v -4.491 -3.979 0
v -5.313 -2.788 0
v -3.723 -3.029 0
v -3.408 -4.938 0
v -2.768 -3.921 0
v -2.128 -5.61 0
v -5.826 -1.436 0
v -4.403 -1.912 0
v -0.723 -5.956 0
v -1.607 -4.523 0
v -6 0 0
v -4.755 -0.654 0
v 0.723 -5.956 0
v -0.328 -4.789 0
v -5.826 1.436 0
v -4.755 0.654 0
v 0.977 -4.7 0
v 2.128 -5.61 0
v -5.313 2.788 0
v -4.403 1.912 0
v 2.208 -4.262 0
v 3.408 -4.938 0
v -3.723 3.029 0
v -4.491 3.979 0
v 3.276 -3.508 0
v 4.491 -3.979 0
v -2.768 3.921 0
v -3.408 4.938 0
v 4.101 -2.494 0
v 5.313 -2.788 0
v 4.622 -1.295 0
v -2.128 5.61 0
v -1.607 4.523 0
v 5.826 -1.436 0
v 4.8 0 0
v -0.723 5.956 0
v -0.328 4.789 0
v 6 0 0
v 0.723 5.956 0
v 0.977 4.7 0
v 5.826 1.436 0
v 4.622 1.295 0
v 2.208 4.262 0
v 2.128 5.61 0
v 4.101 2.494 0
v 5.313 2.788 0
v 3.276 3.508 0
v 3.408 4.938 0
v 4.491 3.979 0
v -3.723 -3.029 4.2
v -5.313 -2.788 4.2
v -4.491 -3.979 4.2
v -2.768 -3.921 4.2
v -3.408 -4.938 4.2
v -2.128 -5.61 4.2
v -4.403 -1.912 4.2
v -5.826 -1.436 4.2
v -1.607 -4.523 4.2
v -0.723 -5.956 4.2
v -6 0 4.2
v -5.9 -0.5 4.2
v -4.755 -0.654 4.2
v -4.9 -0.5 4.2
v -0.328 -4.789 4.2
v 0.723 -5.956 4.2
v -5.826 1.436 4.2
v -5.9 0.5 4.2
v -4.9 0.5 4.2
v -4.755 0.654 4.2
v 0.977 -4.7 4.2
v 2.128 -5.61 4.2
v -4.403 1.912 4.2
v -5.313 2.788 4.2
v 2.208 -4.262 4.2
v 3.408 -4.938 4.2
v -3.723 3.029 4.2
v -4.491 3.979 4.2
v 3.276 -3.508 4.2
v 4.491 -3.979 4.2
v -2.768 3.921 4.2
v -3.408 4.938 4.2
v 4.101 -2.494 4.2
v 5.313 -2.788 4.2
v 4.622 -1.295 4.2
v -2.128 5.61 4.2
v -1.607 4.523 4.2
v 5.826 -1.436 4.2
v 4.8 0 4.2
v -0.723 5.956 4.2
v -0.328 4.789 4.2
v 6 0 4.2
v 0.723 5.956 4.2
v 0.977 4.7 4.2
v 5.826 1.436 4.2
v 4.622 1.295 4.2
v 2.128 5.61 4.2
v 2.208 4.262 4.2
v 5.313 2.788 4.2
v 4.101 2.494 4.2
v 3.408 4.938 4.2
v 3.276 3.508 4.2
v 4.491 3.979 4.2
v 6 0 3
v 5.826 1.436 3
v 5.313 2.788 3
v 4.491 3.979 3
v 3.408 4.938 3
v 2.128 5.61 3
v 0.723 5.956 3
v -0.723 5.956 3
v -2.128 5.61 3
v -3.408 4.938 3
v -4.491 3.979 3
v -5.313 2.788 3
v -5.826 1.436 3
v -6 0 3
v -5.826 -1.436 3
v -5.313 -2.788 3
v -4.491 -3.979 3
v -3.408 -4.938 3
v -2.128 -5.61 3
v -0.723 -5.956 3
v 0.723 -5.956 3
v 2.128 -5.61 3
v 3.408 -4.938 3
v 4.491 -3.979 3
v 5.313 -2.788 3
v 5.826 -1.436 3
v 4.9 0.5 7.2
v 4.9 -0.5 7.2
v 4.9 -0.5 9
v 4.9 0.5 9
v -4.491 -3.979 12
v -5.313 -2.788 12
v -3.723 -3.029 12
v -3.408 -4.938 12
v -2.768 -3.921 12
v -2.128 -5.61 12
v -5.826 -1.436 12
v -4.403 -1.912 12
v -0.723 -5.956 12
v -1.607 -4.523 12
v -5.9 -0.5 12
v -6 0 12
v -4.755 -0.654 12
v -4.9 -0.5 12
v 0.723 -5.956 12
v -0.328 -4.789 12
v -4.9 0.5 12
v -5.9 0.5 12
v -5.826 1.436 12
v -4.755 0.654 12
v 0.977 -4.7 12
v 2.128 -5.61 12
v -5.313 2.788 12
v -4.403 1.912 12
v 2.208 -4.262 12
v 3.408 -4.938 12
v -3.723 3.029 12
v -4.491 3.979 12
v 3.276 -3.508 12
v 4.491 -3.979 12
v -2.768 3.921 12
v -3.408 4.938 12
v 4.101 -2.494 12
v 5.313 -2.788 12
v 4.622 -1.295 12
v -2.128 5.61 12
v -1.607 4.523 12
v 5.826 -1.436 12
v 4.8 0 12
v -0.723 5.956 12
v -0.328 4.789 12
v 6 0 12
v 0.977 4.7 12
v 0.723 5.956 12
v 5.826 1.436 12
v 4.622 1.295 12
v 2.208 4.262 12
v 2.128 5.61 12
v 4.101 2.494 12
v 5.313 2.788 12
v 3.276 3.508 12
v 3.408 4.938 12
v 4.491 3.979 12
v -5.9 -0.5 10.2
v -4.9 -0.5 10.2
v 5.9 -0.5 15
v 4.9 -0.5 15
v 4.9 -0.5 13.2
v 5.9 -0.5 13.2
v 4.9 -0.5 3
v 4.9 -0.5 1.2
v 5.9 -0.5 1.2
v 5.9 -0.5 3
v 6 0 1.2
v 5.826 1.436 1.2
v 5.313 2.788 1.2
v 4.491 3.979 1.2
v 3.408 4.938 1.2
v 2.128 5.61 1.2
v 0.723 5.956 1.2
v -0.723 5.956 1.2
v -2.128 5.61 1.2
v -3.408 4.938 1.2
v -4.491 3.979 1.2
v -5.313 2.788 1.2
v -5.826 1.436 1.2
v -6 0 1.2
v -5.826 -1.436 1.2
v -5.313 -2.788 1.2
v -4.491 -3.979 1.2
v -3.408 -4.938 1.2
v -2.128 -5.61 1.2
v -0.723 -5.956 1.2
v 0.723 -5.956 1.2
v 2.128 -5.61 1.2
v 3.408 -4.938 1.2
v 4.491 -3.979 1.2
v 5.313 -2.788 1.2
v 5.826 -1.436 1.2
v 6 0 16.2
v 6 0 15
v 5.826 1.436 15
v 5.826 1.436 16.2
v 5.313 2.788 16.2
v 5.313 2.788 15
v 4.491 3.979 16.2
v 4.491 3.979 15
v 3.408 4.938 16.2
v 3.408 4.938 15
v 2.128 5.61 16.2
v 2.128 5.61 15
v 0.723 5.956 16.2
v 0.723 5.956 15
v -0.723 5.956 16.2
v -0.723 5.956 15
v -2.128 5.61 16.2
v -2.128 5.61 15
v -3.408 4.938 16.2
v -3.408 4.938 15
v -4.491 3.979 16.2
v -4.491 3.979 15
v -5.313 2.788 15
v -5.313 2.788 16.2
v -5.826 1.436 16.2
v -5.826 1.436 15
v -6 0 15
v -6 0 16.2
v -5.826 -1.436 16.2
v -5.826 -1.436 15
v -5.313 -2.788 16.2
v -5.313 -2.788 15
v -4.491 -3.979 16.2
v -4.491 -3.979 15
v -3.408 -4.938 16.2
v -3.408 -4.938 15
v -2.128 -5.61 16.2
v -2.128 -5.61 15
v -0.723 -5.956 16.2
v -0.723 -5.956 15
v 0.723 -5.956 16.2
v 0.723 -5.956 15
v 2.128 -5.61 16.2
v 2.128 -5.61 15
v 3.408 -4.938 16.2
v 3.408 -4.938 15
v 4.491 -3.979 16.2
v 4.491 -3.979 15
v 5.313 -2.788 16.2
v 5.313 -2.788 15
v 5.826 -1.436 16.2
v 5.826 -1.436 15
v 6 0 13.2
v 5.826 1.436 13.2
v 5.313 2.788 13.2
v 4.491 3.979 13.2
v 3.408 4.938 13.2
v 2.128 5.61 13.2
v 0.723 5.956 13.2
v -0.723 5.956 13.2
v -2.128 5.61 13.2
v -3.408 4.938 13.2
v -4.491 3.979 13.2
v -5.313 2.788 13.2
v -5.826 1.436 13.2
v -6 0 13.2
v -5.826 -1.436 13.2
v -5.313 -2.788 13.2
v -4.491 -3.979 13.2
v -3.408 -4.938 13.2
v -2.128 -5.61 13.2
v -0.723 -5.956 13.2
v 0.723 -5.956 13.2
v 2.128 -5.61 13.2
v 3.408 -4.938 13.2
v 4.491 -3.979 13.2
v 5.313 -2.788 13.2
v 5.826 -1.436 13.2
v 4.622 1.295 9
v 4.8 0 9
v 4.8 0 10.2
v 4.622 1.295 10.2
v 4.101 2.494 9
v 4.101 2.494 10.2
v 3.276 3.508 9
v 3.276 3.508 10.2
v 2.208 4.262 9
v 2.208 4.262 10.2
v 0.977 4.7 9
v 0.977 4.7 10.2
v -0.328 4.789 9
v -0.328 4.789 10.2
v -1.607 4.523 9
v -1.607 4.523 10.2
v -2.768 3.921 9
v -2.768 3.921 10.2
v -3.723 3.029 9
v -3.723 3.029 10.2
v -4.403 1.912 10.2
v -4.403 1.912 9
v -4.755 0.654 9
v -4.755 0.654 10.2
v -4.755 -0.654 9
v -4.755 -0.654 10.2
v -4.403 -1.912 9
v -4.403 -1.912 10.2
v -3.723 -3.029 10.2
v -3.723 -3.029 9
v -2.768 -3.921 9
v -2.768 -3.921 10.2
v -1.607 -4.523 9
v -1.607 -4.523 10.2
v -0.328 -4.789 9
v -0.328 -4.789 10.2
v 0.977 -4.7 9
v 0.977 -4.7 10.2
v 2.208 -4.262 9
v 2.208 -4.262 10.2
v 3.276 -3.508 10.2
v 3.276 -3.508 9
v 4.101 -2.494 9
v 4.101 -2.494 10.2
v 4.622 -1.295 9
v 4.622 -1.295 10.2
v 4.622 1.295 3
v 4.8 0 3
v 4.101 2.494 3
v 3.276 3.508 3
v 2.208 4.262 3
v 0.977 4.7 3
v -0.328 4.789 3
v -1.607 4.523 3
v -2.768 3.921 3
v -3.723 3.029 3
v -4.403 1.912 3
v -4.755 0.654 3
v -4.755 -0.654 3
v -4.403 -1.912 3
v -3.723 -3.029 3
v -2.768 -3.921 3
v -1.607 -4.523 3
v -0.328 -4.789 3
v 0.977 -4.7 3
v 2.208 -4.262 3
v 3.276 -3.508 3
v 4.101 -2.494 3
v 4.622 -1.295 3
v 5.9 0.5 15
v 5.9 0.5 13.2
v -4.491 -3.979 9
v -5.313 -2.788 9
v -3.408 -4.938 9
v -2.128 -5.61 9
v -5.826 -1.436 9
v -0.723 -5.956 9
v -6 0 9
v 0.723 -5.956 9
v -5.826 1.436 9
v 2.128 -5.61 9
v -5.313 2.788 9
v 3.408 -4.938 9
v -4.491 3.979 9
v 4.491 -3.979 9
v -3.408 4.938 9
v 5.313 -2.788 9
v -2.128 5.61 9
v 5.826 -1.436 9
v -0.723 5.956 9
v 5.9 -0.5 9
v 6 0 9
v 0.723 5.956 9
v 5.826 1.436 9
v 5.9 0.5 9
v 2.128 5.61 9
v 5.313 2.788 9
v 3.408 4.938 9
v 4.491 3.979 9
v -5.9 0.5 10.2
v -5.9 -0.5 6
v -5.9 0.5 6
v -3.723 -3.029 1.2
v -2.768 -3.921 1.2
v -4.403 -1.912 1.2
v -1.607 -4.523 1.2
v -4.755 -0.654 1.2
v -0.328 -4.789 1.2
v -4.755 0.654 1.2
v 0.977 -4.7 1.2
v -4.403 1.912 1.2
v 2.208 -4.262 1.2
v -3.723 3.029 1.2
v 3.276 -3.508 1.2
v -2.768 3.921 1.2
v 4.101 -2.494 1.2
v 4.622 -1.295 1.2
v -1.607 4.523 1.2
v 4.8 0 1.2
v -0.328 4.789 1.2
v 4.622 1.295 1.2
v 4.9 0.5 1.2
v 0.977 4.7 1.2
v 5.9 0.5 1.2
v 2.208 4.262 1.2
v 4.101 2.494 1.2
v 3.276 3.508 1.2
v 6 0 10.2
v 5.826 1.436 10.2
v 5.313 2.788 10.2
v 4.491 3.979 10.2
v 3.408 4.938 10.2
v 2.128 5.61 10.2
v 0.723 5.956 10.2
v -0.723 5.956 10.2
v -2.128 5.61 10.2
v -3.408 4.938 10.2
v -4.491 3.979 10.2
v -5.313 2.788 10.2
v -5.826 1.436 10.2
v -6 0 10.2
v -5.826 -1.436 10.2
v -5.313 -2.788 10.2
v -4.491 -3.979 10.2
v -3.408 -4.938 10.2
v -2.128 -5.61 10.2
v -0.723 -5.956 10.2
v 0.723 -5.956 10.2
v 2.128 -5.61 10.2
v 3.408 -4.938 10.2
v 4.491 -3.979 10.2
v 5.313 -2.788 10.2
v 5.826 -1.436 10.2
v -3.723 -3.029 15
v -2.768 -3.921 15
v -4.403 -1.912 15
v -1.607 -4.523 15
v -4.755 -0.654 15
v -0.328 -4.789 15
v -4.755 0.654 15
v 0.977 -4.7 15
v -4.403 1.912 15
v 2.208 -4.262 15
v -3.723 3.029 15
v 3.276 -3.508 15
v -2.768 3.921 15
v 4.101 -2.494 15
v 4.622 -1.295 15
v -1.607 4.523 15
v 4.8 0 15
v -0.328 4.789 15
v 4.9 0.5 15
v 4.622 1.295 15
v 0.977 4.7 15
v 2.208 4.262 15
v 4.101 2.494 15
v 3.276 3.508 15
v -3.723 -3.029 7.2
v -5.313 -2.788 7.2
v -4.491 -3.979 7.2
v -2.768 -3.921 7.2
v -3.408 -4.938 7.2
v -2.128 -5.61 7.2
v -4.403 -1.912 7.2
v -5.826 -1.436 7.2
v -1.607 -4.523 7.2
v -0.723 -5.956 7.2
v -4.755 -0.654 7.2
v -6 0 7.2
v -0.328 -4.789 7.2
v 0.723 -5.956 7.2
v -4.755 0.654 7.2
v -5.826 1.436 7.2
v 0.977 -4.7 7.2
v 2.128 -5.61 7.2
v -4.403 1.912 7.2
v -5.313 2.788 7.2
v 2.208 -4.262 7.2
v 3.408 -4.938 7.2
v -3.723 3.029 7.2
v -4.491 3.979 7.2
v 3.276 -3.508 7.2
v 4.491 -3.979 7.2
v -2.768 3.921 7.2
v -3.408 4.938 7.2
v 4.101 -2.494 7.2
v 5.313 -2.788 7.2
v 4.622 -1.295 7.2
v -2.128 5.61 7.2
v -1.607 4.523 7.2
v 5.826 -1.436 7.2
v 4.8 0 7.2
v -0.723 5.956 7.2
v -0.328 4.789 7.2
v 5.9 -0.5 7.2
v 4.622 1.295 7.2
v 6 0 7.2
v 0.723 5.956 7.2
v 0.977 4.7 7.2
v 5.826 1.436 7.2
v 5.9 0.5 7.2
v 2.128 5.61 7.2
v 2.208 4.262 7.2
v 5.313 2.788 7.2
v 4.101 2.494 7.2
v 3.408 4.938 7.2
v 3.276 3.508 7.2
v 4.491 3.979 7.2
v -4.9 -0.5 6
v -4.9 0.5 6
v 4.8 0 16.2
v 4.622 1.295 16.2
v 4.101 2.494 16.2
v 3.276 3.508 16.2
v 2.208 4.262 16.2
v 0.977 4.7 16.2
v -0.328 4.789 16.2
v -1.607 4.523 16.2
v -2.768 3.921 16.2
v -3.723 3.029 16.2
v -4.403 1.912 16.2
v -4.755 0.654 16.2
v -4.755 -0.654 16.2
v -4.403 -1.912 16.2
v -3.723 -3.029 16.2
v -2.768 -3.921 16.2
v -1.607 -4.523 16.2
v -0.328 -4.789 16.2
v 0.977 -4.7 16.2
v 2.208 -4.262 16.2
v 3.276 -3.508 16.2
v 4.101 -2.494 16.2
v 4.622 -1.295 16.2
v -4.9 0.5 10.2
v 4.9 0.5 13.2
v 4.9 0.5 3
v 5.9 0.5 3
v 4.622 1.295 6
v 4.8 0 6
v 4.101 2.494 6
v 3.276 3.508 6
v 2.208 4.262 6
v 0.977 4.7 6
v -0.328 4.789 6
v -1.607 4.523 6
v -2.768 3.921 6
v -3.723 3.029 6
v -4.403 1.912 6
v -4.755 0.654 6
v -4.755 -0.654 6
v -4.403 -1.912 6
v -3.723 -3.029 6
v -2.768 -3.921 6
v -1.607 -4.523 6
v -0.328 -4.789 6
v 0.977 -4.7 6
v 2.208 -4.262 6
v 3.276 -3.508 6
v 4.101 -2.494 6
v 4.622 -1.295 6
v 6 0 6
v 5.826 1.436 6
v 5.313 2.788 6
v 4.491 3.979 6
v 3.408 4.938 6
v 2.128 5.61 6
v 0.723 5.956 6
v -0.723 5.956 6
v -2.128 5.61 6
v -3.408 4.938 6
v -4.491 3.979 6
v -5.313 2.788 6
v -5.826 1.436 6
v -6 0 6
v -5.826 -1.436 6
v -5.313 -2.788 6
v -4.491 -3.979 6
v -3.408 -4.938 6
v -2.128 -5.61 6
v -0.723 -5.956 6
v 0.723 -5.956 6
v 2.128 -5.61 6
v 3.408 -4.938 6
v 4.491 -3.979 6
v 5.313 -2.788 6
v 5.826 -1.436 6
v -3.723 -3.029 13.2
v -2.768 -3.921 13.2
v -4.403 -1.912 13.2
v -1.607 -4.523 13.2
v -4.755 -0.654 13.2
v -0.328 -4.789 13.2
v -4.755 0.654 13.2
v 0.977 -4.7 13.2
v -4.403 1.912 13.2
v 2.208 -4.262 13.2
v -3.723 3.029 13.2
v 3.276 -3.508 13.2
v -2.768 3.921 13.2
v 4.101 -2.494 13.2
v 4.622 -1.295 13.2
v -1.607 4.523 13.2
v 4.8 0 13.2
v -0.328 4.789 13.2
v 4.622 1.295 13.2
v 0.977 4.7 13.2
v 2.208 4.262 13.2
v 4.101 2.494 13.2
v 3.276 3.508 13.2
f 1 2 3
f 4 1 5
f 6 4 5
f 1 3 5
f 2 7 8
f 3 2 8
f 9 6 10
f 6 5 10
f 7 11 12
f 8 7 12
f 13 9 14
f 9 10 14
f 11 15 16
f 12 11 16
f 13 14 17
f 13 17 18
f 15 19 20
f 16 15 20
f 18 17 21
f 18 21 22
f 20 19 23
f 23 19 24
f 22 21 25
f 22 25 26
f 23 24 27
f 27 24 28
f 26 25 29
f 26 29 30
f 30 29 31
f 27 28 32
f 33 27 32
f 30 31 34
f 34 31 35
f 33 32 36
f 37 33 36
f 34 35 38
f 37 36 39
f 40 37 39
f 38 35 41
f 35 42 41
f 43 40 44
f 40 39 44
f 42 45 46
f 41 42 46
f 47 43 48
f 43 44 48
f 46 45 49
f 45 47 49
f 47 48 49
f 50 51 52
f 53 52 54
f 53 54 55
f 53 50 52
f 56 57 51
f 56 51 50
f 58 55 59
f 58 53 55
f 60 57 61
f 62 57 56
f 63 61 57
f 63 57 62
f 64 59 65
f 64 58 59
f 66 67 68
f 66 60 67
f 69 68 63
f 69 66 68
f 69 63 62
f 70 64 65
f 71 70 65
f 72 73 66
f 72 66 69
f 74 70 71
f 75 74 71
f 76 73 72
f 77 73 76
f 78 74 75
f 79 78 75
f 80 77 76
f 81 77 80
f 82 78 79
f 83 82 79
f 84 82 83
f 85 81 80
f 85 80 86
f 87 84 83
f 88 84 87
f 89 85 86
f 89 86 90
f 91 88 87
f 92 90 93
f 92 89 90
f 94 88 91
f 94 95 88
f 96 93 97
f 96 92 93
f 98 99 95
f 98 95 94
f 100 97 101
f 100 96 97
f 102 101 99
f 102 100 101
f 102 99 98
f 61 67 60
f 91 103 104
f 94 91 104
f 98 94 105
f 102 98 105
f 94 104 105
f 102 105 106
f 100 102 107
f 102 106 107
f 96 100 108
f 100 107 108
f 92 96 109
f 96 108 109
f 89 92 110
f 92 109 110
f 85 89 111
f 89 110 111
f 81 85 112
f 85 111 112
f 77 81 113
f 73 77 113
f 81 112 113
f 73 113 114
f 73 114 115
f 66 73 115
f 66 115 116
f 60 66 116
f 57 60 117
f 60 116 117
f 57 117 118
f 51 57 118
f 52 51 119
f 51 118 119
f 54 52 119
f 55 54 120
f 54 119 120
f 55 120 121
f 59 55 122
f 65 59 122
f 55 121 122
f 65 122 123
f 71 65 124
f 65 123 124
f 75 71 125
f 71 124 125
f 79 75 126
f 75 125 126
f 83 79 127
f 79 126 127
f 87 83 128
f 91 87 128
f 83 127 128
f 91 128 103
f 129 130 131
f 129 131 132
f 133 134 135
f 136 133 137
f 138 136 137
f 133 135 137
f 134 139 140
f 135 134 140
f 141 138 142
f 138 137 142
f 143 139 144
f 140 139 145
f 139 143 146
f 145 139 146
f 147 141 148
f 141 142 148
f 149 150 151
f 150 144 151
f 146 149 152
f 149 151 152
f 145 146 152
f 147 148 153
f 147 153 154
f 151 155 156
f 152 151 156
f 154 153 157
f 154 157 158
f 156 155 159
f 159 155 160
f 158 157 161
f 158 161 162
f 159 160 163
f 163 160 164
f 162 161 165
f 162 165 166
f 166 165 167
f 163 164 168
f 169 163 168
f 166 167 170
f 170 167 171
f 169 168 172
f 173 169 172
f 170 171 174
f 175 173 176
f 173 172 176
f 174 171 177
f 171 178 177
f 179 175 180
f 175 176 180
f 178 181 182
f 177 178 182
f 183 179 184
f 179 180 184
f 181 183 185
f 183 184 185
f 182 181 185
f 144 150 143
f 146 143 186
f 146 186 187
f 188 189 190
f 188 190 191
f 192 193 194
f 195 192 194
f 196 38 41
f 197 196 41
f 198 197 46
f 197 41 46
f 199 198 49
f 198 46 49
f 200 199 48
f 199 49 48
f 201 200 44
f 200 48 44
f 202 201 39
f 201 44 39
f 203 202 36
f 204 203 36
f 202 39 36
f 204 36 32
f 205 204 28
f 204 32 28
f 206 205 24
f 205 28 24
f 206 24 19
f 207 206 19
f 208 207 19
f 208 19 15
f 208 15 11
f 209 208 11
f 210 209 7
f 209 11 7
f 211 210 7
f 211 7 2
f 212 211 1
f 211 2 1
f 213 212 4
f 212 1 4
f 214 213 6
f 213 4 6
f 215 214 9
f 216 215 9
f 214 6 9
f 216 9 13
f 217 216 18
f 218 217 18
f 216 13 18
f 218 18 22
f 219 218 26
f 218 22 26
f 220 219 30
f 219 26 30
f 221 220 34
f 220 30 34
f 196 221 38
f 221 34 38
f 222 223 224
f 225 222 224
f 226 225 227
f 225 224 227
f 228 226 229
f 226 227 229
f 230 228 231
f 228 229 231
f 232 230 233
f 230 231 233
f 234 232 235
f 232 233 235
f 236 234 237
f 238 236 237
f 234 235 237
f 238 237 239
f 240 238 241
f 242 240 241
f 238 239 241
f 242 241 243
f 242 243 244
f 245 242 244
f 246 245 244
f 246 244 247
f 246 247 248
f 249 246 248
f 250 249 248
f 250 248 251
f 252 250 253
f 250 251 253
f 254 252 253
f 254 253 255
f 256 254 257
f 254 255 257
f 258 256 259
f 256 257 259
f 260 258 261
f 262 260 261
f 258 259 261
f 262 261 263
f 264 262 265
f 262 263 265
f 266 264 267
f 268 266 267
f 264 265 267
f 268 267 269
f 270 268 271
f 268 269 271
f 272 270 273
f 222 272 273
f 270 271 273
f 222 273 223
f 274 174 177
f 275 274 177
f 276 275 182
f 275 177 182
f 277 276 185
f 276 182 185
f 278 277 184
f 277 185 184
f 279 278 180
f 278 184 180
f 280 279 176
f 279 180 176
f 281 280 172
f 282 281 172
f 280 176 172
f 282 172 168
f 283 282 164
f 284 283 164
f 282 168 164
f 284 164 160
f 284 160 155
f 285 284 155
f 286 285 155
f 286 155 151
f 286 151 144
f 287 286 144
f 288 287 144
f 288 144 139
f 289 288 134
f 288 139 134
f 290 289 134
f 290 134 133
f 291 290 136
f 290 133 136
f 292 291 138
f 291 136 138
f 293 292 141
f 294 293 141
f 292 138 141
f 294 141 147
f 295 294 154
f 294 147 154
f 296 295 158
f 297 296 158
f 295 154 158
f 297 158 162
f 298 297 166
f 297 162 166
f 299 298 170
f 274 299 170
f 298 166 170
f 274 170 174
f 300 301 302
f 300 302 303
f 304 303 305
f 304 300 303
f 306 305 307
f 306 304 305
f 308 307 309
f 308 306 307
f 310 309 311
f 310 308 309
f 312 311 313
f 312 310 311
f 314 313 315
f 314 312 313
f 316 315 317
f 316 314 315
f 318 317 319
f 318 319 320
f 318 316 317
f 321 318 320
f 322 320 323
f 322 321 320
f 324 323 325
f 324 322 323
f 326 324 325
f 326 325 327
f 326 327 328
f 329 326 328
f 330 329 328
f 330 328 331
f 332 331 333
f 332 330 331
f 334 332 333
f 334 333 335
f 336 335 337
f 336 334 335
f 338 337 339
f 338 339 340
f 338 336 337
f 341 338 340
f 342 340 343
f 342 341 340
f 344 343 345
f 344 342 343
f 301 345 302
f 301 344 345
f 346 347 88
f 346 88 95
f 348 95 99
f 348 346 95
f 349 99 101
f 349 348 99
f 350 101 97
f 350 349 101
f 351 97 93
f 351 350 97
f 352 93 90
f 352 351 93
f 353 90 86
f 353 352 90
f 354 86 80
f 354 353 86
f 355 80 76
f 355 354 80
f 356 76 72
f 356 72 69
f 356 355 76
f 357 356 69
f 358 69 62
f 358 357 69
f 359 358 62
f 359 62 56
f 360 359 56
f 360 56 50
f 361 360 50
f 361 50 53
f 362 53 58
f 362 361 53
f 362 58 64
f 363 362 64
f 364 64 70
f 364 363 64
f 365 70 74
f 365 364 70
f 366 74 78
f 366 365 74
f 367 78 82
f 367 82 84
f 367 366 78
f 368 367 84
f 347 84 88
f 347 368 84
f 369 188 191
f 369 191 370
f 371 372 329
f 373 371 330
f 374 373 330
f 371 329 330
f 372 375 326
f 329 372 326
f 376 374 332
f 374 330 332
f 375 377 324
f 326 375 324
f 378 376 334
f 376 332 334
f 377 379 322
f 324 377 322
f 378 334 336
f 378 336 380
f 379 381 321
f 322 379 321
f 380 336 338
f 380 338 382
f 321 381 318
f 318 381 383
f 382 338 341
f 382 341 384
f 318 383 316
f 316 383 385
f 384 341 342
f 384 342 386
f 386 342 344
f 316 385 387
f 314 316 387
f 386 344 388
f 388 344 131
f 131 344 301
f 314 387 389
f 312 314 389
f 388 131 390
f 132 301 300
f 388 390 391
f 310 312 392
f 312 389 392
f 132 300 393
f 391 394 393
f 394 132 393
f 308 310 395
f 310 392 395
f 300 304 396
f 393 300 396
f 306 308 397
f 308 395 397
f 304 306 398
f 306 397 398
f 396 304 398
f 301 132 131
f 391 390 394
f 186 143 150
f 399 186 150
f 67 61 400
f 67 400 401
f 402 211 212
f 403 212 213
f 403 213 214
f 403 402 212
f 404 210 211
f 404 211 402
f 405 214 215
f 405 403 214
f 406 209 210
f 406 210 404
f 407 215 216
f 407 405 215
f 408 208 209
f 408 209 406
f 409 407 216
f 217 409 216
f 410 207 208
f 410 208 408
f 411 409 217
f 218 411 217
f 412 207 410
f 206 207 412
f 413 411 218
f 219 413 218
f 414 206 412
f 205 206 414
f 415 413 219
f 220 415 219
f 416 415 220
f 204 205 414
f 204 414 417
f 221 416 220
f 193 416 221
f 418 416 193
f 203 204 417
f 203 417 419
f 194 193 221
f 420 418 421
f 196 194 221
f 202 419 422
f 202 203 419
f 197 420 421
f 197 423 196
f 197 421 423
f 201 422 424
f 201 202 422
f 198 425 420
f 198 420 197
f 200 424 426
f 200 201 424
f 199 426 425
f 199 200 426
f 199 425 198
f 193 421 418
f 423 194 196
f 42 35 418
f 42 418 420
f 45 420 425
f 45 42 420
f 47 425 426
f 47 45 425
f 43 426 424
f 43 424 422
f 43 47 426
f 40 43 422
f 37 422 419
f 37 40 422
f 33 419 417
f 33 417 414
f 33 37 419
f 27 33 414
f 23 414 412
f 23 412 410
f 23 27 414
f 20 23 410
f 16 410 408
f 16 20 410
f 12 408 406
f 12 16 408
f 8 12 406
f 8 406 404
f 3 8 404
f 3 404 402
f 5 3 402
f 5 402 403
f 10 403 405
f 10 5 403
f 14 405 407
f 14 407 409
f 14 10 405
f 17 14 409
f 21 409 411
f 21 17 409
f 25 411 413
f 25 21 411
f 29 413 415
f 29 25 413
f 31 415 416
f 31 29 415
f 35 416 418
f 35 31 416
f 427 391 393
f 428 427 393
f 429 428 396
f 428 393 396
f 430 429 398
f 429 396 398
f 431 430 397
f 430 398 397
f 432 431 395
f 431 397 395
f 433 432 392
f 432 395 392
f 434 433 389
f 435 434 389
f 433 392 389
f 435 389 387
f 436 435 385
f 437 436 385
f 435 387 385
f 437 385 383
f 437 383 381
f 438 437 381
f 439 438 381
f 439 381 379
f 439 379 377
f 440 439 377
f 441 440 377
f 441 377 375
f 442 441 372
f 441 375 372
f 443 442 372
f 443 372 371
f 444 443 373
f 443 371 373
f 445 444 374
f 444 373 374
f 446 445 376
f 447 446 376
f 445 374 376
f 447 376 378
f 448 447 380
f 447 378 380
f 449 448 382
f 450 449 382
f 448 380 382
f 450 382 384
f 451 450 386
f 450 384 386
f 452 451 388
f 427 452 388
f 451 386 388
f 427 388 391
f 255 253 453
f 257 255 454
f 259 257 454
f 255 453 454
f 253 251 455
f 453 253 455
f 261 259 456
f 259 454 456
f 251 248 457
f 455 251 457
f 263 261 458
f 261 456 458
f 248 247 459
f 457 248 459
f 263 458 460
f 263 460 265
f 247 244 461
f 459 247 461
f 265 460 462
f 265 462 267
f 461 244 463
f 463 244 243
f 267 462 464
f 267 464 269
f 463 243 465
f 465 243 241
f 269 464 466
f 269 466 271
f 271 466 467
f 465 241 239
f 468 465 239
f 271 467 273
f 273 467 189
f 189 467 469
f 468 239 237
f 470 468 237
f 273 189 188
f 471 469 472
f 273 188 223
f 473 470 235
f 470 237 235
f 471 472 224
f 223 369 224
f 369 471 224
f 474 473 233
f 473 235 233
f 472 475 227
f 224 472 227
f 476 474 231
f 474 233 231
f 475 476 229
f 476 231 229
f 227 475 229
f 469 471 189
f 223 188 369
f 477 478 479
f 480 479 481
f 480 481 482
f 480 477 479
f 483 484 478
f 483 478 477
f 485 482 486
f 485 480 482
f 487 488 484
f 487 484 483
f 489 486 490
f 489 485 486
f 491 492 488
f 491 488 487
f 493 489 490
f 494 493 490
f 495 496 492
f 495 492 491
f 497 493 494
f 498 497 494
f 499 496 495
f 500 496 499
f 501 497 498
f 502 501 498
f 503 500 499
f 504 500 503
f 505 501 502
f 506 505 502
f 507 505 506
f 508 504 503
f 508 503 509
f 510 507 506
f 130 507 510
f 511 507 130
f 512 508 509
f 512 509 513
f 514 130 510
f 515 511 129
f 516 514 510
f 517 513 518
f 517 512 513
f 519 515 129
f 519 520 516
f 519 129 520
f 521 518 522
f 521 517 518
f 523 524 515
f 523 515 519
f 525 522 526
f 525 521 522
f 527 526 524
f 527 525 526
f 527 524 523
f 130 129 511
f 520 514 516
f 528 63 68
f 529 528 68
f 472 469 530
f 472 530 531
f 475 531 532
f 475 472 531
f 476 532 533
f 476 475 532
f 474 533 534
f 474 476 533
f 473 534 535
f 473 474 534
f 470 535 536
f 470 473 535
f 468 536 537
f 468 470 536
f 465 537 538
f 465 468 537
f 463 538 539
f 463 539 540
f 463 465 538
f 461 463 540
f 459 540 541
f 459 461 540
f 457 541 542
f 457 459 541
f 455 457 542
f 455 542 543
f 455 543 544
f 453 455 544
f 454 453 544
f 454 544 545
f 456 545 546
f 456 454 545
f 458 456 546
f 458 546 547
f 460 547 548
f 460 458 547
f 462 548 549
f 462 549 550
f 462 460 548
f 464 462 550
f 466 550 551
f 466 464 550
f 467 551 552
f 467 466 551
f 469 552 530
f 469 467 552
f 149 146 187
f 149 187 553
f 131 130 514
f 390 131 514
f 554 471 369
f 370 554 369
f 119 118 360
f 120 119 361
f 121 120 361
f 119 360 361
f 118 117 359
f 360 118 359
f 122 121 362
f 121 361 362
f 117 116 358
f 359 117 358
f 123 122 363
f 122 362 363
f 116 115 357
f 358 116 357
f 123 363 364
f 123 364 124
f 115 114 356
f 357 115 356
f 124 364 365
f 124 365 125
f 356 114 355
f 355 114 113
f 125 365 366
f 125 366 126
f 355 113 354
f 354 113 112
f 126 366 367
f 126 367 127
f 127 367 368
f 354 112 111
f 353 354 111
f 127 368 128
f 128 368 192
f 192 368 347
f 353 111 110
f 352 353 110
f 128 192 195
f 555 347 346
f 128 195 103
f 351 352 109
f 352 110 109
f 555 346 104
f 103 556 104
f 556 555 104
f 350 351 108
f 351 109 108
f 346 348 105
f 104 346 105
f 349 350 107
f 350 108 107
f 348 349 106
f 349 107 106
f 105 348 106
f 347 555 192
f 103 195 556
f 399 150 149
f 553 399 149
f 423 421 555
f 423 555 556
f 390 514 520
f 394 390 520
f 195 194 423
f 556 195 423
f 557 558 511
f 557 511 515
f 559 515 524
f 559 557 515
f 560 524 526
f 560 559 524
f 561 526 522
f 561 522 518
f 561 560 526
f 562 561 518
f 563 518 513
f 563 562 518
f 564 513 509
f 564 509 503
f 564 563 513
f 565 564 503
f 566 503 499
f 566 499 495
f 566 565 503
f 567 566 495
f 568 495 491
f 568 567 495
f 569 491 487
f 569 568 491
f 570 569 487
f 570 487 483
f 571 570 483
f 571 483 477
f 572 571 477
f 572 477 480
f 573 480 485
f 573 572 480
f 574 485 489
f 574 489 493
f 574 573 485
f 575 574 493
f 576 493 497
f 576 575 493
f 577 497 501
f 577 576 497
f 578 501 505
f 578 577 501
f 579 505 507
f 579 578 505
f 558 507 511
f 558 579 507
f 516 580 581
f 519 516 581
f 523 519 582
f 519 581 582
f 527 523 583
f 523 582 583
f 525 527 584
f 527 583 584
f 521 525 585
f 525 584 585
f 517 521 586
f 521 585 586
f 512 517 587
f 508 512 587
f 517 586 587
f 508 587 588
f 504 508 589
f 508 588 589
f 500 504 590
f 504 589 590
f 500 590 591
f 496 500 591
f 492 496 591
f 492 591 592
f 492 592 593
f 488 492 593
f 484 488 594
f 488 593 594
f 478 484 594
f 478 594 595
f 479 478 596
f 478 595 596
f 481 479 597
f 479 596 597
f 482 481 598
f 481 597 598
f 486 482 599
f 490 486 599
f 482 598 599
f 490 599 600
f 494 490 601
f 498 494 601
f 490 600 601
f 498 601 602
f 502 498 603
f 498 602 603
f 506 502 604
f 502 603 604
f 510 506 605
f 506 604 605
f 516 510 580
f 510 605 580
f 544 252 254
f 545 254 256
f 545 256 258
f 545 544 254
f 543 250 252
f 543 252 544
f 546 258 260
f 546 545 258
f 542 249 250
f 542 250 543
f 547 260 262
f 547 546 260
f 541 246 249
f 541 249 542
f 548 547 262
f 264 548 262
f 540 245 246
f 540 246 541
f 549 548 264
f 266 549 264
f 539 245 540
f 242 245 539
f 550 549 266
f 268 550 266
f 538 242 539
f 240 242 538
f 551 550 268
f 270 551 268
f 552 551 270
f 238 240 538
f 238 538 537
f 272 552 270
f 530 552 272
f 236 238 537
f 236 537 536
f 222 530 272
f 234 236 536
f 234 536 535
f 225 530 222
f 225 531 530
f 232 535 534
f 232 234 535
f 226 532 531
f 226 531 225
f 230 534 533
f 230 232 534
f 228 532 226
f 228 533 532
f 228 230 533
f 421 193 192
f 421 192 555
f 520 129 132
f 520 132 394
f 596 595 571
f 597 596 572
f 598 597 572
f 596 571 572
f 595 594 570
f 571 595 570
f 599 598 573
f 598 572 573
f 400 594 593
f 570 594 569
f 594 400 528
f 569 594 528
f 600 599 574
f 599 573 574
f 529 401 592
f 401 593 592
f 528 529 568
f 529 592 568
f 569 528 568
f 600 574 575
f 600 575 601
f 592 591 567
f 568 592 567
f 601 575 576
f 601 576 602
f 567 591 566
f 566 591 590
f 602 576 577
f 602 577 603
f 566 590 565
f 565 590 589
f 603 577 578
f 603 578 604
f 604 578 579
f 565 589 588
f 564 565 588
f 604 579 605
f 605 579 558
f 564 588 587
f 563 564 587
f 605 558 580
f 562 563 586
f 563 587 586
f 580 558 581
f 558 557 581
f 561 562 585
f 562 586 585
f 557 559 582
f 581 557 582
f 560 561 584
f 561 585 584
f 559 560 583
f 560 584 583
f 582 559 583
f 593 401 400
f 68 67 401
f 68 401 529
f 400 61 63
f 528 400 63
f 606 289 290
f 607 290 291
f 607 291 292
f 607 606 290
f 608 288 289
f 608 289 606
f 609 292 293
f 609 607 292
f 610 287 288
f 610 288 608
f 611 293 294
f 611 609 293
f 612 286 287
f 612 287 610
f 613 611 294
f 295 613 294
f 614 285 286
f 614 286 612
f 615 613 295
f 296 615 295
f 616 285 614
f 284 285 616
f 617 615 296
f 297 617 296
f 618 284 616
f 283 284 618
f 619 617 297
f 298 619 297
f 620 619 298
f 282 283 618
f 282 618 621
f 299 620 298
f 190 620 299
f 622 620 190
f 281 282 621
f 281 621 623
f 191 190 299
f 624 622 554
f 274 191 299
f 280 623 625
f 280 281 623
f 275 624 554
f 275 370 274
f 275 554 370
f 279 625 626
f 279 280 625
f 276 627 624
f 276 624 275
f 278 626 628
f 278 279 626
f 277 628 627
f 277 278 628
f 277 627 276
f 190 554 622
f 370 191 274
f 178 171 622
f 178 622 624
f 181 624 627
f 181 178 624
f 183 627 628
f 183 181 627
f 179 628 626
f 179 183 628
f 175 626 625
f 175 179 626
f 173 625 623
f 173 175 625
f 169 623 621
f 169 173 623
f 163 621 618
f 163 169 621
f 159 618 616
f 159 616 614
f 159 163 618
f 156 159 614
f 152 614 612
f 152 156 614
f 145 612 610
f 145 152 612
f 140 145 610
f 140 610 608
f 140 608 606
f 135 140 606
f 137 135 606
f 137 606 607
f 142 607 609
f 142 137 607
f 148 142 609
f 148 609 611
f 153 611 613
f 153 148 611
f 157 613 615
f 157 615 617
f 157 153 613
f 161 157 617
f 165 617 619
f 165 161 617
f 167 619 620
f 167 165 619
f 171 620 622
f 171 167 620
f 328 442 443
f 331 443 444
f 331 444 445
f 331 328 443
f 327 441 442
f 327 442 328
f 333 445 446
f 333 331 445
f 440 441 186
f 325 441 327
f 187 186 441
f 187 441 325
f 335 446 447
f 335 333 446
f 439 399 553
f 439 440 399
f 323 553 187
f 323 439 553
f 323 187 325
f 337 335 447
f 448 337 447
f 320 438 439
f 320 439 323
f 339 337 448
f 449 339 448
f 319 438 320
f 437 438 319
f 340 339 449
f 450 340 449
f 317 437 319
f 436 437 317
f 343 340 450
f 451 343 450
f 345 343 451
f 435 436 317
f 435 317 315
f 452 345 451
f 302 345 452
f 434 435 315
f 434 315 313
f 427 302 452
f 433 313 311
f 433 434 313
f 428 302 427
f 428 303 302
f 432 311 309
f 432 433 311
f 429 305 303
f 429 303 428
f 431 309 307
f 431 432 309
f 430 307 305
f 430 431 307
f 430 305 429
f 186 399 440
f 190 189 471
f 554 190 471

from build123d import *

# Parameters (mm, degrees)
SKETCH1_R   = 6
SKETCH1_R_2 = 4.8
COIL1_DEPTH = 1.2
SKETCH2_R   = 6
SKETCH2_R_2 = 4.8
COIL2_DEPTH = 1.2
SKETCH3_R   = 6
SKETCH3_R_2 = 4.8
COIL3_DEPTH = 1.2
SKETCH4_R   = 6
SKETCH4_R_2 = 4.8
COIL4_DEPTH = 1.2
SKETCH5_R   = 6
SKETCH5_R_2 = 4.8
COIL5_DEPTH = 1.2
SKETCH6_R   = 6
SKETCH6_R_2 = 4.8
COIL6_DEPTH = 1.2
SKETCH7_W   = 1
SKETCH7_H   = 1
LINK1_DEPTH = 1.8
SKETCH8_W   = 1
SKETCH8_H   = 1
LINK2_DEPTH = 1.8
SKETCH9_W   = 1
SKETCH9_H   = 1
LINK3_DEPTH = 1.8
SKETCH10_W  = 1
SKETCH10_H  = 1
LINK4_DEPTH = 1.8
SKETCH11_W  = 1
SKETCH11_H  = 1
LINK5_DEPTH = 1.8


with BuildPart() as part:
    # Sketch1 → Coil1 (new body)
    with BuildSketch(Plane.XY):
        Circle(SKETCH1_R)
        Circle(SKETCH1_R_2, mode=Mode.SUBTRACT)
    extrude(amount=COIL1_DEPTH)



with BuildPart() as body_2:
    # Sketch2 → Coil2 (new body)
    with BuildSketch(Plane.XY.offset(3)):
        Circle(SKETCH2_R)
        Circle(SKETCH2_R_2, mode=Mode.SUBTRACT)
    extrude(amount=COIL2_DEPTH)


with BuildPart() as body_3:
    # Sketch3 → Coil3 (new body)
    with BuildSketch(Plane.XY.offset(6)):
        Circle(SKETCH3_R)
        Circle(SKETCH3_R_2, mode=Mode.SUBTRACT)
    extrude(amount=COIL3_DEPTH)


with BuildPart() as body_4:
    # Sketch4 → Coil4 (new body)
    with BuildSketch(Plane.XY.offset(9)):
        Circle(SKETCH4_R)
        Circle(SKETCH4_R_2, mode=Mode.SUBTRACT)
    extrude(amount=COIL4_DEPTH)


with BuildPart() as body_5:
    # Sketch5 → Coil5 (new body)
    with BuildSketch(Plane.XY.offset(12)):
        Circle(SKETCH5_R)
        Circle(SKETCH5_R_2, mode=Mode.SUBTRACT)
    extrude(amount=COIL5_DEPTH)


with BuildPart() as body_6:
    # Sketch6 → Coil6 (new body)
    with BuildSketch(Plane.XY.offset(15)):
        Circle(SKETCH6_R)
        Circle(SKETCH6_R_2, mode=Mode.SUBTRACT)
    extrude(amount=COIL6_DEPTH)


with BuildPart() as part_1:
    add(part.part)

    add(body_2.part)  # Link1 merges body 2
    # Sketch7 → Link1 (add)
    with BuildSketch(Plane.XY.offset(1.2)):
        with Locations((5.4, 0)):
            Rectangle(SKETCH7_W, SKETCH7_H)
    extrude(amount=LINK1_DEPTH)


    add(body_3.part)  # Link2 merges body 3
    # Sketch8 → Link2 (add)
    with BuildSketch(Plane.XY.offset(4.2)):
        with Locations((-5.4, 0)):
            Rectangle(SKETCH8_W, SKETCH8_H)
    extrude(amount=LINK2_DEPTH)


    add(body_4.part)  # Link3 merges body 4
    # Sketch9 → Link3 (add)
    with BuildSketch(Plane.XY.offset(7.2)):
        with Locations((5.4, 0)):
            Rectangle(SKETCH9_W, SKETCH9_H)
    extrude(amount=LINK3_DEPTH)


    add(body_5.part)  # Link4 merges body 5
    # Sketch10 → Link4 (add)
    with BuildSketch(Plane.XY.offset(10.2)):
        with Locations((-5.4, 0)):
            Rectangle(SKETCH10_W, SKETCH10_H)
    extrude(amount=LINK4_DEPTH)


    add(body_6.part)  # Link5 merges body 6
    # Sketch11 → Link5 (add)
    with BuildSketch(Plane.XY.offset(13.2)):
        with Locations((5.4, 0)):
            Rectangle(SKETCH11_W, SKETCH11_H)
    extrude(amount=LINK5_DEPTH)


solid = part_1.part
